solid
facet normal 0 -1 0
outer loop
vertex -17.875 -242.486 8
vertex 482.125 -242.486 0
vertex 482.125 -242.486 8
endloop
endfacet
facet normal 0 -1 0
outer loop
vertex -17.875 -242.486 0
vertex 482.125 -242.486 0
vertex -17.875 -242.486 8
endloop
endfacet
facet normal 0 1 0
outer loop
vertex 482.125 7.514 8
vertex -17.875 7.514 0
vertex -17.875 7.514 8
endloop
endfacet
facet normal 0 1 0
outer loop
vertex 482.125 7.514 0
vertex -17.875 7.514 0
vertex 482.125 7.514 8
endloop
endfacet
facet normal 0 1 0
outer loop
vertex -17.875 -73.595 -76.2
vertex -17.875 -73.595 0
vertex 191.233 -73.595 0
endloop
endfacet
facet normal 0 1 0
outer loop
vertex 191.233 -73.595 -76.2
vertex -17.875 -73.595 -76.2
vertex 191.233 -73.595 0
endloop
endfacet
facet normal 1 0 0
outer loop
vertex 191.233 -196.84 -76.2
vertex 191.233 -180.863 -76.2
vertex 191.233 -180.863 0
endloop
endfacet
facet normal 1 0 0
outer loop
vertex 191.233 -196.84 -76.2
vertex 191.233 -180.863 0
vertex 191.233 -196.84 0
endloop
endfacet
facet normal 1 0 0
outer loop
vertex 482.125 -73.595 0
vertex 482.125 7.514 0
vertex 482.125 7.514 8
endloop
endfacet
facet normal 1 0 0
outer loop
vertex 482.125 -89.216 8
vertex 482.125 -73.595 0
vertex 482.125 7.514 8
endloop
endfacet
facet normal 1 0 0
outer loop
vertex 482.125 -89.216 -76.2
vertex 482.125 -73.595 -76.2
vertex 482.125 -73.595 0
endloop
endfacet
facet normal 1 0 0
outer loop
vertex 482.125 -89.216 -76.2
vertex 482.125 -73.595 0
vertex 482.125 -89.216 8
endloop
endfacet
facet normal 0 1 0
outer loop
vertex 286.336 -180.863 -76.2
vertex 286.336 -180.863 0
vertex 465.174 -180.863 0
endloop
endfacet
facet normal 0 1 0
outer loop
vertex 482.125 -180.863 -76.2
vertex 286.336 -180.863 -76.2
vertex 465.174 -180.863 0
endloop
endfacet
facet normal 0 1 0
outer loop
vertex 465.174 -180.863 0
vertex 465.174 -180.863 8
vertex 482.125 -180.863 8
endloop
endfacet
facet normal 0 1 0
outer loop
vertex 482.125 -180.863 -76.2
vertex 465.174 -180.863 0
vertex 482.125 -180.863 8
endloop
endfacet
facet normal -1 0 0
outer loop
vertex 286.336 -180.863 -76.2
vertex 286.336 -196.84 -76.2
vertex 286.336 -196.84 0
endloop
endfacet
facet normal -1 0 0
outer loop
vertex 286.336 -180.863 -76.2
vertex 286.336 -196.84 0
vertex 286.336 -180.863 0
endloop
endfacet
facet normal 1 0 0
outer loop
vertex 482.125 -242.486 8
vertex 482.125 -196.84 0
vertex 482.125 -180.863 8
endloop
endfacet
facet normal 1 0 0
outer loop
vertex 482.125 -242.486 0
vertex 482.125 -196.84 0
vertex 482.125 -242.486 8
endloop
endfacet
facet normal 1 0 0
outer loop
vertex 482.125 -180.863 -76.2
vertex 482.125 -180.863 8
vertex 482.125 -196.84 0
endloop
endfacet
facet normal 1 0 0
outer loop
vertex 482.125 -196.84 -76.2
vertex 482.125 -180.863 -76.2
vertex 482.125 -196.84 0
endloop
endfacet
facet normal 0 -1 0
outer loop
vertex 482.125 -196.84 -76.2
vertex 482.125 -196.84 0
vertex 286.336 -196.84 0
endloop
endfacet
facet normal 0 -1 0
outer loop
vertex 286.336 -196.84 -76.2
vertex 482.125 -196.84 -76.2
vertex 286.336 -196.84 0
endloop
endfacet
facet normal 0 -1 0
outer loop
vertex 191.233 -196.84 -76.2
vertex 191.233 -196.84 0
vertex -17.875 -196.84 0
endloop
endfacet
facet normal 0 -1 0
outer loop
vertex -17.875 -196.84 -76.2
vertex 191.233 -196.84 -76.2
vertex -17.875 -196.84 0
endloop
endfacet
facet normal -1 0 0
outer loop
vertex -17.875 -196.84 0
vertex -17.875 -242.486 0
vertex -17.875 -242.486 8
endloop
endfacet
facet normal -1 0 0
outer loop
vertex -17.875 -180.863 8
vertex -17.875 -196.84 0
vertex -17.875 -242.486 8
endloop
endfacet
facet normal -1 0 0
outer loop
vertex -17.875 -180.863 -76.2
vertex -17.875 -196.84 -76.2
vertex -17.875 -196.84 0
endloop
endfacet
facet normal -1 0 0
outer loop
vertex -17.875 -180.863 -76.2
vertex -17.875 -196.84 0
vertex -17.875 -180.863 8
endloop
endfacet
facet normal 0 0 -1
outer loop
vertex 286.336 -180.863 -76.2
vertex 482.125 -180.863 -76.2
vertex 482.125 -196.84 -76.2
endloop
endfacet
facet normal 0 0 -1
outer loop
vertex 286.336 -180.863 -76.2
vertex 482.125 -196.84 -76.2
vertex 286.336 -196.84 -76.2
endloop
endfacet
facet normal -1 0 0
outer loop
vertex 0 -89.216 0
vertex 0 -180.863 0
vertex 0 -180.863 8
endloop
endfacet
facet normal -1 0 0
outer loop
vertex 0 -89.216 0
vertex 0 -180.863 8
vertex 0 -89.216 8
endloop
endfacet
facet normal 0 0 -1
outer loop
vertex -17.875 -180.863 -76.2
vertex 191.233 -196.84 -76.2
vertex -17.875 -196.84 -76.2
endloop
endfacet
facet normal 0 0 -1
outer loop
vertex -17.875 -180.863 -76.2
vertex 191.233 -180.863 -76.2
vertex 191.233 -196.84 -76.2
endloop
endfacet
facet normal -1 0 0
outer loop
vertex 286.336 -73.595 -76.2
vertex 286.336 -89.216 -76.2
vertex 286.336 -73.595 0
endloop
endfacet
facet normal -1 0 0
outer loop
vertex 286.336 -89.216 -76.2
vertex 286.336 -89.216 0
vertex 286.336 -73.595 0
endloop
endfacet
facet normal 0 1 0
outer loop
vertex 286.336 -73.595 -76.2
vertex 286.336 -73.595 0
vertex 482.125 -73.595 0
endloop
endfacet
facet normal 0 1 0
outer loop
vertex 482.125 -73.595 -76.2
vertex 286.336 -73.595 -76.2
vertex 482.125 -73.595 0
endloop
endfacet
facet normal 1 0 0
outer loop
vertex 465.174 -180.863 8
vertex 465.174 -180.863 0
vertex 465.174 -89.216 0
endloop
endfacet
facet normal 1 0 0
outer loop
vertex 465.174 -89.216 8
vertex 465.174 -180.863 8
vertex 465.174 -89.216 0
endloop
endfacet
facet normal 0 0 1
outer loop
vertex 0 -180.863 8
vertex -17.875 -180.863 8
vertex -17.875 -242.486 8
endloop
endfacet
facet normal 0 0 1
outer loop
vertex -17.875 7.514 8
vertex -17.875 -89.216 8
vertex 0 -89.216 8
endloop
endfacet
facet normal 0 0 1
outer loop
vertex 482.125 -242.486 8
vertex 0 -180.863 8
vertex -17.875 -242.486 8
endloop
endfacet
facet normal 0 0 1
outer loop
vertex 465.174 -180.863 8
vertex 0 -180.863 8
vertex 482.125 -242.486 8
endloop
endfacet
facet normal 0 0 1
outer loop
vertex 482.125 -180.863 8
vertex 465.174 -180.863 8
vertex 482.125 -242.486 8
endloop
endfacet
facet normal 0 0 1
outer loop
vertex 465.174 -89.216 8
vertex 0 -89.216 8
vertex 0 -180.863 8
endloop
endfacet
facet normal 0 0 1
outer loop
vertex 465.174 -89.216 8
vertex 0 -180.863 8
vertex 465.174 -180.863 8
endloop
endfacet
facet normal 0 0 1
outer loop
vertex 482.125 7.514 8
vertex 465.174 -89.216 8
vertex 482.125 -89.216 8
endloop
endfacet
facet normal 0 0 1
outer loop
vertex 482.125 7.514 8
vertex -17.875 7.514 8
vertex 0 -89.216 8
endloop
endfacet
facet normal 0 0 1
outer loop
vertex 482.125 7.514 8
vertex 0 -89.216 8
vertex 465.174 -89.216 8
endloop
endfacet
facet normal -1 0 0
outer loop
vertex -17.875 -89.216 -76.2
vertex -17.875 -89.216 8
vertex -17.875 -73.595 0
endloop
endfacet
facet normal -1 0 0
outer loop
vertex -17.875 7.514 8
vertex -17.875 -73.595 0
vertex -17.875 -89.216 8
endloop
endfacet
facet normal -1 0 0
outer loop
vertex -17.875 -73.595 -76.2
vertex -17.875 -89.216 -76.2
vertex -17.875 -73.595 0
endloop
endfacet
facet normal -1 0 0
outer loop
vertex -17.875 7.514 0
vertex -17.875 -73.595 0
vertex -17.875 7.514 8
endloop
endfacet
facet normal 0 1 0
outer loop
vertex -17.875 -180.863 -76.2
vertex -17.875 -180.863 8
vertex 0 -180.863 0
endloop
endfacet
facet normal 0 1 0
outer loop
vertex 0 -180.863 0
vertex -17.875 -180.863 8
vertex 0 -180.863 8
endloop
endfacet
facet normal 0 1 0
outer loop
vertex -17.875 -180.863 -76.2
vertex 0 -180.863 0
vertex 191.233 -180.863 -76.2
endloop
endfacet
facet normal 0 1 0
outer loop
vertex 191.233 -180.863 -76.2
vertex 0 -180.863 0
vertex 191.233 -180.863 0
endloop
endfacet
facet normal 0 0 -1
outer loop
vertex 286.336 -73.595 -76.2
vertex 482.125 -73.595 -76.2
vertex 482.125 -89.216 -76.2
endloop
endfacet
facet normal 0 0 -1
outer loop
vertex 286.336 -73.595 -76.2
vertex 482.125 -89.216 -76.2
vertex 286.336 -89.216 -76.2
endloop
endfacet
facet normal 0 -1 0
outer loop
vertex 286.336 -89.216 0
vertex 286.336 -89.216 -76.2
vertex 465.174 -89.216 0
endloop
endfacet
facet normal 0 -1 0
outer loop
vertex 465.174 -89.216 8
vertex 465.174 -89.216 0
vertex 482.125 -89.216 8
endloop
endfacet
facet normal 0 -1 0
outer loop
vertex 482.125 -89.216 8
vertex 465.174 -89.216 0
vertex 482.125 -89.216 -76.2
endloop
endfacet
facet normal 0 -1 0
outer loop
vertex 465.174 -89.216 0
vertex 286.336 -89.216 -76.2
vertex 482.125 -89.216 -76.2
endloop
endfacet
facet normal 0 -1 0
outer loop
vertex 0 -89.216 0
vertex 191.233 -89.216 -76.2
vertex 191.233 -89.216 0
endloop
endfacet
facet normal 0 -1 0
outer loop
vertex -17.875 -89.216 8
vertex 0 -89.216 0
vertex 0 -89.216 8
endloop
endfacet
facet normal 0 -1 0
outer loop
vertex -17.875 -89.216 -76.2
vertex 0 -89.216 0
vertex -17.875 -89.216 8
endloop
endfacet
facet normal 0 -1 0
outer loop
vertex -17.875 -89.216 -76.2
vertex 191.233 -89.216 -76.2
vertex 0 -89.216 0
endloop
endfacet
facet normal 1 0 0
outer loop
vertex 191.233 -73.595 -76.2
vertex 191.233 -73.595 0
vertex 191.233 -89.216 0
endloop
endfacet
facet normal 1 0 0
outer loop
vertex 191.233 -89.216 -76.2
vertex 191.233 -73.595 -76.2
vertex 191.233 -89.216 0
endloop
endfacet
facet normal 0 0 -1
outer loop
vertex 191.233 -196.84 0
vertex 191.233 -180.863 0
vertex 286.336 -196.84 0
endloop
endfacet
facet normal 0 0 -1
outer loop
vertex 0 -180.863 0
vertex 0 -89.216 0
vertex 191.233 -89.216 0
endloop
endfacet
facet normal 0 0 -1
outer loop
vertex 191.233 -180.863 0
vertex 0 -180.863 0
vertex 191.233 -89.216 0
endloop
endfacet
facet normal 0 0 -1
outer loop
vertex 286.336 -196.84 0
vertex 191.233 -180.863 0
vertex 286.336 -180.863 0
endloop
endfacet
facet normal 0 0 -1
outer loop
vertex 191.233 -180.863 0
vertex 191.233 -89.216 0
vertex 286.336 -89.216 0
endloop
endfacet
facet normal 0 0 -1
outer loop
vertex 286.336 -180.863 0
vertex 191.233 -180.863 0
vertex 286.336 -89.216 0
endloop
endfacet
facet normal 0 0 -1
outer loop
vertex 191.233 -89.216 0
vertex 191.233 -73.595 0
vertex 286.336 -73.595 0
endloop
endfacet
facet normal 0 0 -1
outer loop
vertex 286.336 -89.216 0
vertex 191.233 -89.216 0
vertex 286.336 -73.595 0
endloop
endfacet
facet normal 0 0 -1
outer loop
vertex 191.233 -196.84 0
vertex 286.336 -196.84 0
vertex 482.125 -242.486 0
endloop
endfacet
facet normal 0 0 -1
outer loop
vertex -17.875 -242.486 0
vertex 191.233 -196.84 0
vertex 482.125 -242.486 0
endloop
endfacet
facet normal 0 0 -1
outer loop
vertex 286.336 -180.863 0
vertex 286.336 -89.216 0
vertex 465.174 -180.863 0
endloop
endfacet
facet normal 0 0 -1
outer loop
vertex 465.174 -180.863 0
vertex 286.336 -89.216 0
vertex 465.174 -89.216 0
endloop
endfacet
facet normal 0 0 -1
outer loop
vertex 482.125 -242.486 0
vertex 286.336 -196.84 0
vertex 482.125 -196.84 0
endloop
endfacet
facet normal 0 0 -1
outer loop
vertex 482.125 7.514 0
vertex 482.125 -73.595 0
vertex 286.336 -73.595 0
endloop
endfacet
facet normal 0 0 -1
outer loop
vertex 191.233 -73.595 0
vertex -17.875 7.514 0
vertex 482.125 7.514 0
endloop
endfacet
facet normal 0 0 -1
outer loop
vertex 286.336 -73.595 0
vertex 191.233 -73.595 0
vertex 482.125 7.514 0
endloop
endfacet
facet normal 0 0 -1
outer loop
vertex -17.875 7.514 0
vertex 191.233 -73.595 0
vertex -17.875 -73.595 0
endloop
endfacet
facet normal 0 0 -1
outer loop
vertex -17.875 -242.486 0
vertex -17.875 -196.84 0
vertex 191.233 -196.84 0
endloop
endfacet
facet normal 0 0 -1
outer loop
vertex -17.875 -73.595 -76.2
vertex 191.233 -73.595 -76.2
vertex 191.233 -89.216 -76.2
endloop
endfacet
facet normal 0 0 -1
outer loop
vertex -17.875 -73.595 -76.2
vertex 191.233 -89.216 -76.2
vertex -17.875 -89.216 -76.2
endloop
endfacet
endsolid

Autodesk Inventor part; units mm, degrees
ref_plane "YZ Plane" through (0, 0, 0) normal (1, 0, 0) x (0, 1, 0)
ref_plane "XZ Plane" through (0, 0, 0) normal (0, 1, 0) x (-1, 0, 0)
ref_plane "XY Plane" through (0, 0, 0) normal (0, 0, 1) x (1, 0, 0)
sketch "Sketch1" plane through (0, 0, 0) normal (0, 0, 1) x (1, 0, 0)
  line L0 (-17.8746, 7.514) -> (482.1254, 7.514)
  line L1 (482.1254, 7.514) -> (482.1254, -242.486)
  line L2 (482.1254, -242.486) -> (-17.8746, -242.486)
  line L3 (-17.8746, -242.486) -> (-17.8746, 7.514)
  point P0 (0, 0)
  dimension "d0" = 500
  dimension "d1" = 250
extrude "Extrusion1" add sketch "Sketch1" along normal blind 8
sketch "Sketch2" plane through (0, 0, 0) normal (0, 0, -1) x (-1, 0, 0)
  point P0 (0, 0)
sketch "Sketch3" plane through (0, 0, 0) normal (0, 0, -1) x (-1, 0, 0)
  line L0 (17.8746, 7.514) -> (17.8746, -242.486) projected
  line L1 (0, -89.2163) -> (17.8746, -89.2163)
  line L2 (17.8746, -89.2163) -> (17.8746, -180.8626)
  line L3 (17.8746, -180.8626) -> (0, -180.8626)
  line L4 (0, -180.8626) -> (0, -89.2163)
  line L5 (-482.1254, -242.486) -> (-482.1254, 7.514) projected
  line L6 (-465.1744, -89.2163) -> (-482.1254, -89.2163)
  line L7 (-482.1254, -89.2163) -> (-482.1254, -180.8626)
  line L8 (-482.1254, -180.8626) -> (-465.1744, -180.8626)
  line L9 (-465.1744, -180.8626) -> (-465.1744, -89.2163)
  point P0 (0, 0)
extrude "Extrusion2" cut sketch "Sketch3" against normal blind 8
sketch "Sketch4" plane through (0, 0, 0) normal (0, 0, -1) x (-1, 0, 0)
  line L0 (17.8746, -89.2163) -> (17.8746, 7.514) projected
  line L1 (17.8746, -73.5948) -> (-191.2332, -73.5948)
  line L2 (-191.2332, -73.5948) -> (-191.2332, -89.2163)
  line L3 (-191.2332, -89.2163) -> (17.8746, -89.2163)
  line L4 (17.8746, -89.2163) -> (17.8746, -73.5948)
  line L5 (17.8746, -180.8626) -> (0, -180.8626) projected
  line L6 (17.8746, -180.8626) -> (-191.2332, -180.8626)
  line L7 (-191.2332, -180.8626) -> (-191.2332, -196.8404)
  line L8 (-191.2332, -196.8404) -> (17.8746, -196.8404)
  line L9 (17.8746, -196.8404) -> (17.8746, -180.8626)
  line L10 (-482.1254, 7.514) -> (-482.1254, -89.2163) projected
  line L11 (-482.1254, -89.2163) -> (-286.3362, -89.2163)
  line L12 (-286.3362, -89.2163) -> (-286.3362, -73.5948)
  line L13 (-286.3362, -73.5948) -> (-482.1254, -73.5948)
  line L14 (-482.1254, -73.5948) -> (-482.1254, -89.2163)
  line L15 (-482.1254, -180.8626) -> (-482.1254, -242.486) projected
  line L16 (-286.3362, -180.8626) -> (-482.1254, -180.8626)
  line L17 (-482.1254, -180.8626) -> (-482.1254, -196.8404)
  line L18 (-482.1254, -196.8404) -> (-286.3362, -196.8404)
  line L19 (-286.3362, -196.8404) -> (-286.3362, -180.8626)
  point P0 (0, 0)
extrude "Extrusion3" add sketch "Sketch4" along normal blind 76.2
